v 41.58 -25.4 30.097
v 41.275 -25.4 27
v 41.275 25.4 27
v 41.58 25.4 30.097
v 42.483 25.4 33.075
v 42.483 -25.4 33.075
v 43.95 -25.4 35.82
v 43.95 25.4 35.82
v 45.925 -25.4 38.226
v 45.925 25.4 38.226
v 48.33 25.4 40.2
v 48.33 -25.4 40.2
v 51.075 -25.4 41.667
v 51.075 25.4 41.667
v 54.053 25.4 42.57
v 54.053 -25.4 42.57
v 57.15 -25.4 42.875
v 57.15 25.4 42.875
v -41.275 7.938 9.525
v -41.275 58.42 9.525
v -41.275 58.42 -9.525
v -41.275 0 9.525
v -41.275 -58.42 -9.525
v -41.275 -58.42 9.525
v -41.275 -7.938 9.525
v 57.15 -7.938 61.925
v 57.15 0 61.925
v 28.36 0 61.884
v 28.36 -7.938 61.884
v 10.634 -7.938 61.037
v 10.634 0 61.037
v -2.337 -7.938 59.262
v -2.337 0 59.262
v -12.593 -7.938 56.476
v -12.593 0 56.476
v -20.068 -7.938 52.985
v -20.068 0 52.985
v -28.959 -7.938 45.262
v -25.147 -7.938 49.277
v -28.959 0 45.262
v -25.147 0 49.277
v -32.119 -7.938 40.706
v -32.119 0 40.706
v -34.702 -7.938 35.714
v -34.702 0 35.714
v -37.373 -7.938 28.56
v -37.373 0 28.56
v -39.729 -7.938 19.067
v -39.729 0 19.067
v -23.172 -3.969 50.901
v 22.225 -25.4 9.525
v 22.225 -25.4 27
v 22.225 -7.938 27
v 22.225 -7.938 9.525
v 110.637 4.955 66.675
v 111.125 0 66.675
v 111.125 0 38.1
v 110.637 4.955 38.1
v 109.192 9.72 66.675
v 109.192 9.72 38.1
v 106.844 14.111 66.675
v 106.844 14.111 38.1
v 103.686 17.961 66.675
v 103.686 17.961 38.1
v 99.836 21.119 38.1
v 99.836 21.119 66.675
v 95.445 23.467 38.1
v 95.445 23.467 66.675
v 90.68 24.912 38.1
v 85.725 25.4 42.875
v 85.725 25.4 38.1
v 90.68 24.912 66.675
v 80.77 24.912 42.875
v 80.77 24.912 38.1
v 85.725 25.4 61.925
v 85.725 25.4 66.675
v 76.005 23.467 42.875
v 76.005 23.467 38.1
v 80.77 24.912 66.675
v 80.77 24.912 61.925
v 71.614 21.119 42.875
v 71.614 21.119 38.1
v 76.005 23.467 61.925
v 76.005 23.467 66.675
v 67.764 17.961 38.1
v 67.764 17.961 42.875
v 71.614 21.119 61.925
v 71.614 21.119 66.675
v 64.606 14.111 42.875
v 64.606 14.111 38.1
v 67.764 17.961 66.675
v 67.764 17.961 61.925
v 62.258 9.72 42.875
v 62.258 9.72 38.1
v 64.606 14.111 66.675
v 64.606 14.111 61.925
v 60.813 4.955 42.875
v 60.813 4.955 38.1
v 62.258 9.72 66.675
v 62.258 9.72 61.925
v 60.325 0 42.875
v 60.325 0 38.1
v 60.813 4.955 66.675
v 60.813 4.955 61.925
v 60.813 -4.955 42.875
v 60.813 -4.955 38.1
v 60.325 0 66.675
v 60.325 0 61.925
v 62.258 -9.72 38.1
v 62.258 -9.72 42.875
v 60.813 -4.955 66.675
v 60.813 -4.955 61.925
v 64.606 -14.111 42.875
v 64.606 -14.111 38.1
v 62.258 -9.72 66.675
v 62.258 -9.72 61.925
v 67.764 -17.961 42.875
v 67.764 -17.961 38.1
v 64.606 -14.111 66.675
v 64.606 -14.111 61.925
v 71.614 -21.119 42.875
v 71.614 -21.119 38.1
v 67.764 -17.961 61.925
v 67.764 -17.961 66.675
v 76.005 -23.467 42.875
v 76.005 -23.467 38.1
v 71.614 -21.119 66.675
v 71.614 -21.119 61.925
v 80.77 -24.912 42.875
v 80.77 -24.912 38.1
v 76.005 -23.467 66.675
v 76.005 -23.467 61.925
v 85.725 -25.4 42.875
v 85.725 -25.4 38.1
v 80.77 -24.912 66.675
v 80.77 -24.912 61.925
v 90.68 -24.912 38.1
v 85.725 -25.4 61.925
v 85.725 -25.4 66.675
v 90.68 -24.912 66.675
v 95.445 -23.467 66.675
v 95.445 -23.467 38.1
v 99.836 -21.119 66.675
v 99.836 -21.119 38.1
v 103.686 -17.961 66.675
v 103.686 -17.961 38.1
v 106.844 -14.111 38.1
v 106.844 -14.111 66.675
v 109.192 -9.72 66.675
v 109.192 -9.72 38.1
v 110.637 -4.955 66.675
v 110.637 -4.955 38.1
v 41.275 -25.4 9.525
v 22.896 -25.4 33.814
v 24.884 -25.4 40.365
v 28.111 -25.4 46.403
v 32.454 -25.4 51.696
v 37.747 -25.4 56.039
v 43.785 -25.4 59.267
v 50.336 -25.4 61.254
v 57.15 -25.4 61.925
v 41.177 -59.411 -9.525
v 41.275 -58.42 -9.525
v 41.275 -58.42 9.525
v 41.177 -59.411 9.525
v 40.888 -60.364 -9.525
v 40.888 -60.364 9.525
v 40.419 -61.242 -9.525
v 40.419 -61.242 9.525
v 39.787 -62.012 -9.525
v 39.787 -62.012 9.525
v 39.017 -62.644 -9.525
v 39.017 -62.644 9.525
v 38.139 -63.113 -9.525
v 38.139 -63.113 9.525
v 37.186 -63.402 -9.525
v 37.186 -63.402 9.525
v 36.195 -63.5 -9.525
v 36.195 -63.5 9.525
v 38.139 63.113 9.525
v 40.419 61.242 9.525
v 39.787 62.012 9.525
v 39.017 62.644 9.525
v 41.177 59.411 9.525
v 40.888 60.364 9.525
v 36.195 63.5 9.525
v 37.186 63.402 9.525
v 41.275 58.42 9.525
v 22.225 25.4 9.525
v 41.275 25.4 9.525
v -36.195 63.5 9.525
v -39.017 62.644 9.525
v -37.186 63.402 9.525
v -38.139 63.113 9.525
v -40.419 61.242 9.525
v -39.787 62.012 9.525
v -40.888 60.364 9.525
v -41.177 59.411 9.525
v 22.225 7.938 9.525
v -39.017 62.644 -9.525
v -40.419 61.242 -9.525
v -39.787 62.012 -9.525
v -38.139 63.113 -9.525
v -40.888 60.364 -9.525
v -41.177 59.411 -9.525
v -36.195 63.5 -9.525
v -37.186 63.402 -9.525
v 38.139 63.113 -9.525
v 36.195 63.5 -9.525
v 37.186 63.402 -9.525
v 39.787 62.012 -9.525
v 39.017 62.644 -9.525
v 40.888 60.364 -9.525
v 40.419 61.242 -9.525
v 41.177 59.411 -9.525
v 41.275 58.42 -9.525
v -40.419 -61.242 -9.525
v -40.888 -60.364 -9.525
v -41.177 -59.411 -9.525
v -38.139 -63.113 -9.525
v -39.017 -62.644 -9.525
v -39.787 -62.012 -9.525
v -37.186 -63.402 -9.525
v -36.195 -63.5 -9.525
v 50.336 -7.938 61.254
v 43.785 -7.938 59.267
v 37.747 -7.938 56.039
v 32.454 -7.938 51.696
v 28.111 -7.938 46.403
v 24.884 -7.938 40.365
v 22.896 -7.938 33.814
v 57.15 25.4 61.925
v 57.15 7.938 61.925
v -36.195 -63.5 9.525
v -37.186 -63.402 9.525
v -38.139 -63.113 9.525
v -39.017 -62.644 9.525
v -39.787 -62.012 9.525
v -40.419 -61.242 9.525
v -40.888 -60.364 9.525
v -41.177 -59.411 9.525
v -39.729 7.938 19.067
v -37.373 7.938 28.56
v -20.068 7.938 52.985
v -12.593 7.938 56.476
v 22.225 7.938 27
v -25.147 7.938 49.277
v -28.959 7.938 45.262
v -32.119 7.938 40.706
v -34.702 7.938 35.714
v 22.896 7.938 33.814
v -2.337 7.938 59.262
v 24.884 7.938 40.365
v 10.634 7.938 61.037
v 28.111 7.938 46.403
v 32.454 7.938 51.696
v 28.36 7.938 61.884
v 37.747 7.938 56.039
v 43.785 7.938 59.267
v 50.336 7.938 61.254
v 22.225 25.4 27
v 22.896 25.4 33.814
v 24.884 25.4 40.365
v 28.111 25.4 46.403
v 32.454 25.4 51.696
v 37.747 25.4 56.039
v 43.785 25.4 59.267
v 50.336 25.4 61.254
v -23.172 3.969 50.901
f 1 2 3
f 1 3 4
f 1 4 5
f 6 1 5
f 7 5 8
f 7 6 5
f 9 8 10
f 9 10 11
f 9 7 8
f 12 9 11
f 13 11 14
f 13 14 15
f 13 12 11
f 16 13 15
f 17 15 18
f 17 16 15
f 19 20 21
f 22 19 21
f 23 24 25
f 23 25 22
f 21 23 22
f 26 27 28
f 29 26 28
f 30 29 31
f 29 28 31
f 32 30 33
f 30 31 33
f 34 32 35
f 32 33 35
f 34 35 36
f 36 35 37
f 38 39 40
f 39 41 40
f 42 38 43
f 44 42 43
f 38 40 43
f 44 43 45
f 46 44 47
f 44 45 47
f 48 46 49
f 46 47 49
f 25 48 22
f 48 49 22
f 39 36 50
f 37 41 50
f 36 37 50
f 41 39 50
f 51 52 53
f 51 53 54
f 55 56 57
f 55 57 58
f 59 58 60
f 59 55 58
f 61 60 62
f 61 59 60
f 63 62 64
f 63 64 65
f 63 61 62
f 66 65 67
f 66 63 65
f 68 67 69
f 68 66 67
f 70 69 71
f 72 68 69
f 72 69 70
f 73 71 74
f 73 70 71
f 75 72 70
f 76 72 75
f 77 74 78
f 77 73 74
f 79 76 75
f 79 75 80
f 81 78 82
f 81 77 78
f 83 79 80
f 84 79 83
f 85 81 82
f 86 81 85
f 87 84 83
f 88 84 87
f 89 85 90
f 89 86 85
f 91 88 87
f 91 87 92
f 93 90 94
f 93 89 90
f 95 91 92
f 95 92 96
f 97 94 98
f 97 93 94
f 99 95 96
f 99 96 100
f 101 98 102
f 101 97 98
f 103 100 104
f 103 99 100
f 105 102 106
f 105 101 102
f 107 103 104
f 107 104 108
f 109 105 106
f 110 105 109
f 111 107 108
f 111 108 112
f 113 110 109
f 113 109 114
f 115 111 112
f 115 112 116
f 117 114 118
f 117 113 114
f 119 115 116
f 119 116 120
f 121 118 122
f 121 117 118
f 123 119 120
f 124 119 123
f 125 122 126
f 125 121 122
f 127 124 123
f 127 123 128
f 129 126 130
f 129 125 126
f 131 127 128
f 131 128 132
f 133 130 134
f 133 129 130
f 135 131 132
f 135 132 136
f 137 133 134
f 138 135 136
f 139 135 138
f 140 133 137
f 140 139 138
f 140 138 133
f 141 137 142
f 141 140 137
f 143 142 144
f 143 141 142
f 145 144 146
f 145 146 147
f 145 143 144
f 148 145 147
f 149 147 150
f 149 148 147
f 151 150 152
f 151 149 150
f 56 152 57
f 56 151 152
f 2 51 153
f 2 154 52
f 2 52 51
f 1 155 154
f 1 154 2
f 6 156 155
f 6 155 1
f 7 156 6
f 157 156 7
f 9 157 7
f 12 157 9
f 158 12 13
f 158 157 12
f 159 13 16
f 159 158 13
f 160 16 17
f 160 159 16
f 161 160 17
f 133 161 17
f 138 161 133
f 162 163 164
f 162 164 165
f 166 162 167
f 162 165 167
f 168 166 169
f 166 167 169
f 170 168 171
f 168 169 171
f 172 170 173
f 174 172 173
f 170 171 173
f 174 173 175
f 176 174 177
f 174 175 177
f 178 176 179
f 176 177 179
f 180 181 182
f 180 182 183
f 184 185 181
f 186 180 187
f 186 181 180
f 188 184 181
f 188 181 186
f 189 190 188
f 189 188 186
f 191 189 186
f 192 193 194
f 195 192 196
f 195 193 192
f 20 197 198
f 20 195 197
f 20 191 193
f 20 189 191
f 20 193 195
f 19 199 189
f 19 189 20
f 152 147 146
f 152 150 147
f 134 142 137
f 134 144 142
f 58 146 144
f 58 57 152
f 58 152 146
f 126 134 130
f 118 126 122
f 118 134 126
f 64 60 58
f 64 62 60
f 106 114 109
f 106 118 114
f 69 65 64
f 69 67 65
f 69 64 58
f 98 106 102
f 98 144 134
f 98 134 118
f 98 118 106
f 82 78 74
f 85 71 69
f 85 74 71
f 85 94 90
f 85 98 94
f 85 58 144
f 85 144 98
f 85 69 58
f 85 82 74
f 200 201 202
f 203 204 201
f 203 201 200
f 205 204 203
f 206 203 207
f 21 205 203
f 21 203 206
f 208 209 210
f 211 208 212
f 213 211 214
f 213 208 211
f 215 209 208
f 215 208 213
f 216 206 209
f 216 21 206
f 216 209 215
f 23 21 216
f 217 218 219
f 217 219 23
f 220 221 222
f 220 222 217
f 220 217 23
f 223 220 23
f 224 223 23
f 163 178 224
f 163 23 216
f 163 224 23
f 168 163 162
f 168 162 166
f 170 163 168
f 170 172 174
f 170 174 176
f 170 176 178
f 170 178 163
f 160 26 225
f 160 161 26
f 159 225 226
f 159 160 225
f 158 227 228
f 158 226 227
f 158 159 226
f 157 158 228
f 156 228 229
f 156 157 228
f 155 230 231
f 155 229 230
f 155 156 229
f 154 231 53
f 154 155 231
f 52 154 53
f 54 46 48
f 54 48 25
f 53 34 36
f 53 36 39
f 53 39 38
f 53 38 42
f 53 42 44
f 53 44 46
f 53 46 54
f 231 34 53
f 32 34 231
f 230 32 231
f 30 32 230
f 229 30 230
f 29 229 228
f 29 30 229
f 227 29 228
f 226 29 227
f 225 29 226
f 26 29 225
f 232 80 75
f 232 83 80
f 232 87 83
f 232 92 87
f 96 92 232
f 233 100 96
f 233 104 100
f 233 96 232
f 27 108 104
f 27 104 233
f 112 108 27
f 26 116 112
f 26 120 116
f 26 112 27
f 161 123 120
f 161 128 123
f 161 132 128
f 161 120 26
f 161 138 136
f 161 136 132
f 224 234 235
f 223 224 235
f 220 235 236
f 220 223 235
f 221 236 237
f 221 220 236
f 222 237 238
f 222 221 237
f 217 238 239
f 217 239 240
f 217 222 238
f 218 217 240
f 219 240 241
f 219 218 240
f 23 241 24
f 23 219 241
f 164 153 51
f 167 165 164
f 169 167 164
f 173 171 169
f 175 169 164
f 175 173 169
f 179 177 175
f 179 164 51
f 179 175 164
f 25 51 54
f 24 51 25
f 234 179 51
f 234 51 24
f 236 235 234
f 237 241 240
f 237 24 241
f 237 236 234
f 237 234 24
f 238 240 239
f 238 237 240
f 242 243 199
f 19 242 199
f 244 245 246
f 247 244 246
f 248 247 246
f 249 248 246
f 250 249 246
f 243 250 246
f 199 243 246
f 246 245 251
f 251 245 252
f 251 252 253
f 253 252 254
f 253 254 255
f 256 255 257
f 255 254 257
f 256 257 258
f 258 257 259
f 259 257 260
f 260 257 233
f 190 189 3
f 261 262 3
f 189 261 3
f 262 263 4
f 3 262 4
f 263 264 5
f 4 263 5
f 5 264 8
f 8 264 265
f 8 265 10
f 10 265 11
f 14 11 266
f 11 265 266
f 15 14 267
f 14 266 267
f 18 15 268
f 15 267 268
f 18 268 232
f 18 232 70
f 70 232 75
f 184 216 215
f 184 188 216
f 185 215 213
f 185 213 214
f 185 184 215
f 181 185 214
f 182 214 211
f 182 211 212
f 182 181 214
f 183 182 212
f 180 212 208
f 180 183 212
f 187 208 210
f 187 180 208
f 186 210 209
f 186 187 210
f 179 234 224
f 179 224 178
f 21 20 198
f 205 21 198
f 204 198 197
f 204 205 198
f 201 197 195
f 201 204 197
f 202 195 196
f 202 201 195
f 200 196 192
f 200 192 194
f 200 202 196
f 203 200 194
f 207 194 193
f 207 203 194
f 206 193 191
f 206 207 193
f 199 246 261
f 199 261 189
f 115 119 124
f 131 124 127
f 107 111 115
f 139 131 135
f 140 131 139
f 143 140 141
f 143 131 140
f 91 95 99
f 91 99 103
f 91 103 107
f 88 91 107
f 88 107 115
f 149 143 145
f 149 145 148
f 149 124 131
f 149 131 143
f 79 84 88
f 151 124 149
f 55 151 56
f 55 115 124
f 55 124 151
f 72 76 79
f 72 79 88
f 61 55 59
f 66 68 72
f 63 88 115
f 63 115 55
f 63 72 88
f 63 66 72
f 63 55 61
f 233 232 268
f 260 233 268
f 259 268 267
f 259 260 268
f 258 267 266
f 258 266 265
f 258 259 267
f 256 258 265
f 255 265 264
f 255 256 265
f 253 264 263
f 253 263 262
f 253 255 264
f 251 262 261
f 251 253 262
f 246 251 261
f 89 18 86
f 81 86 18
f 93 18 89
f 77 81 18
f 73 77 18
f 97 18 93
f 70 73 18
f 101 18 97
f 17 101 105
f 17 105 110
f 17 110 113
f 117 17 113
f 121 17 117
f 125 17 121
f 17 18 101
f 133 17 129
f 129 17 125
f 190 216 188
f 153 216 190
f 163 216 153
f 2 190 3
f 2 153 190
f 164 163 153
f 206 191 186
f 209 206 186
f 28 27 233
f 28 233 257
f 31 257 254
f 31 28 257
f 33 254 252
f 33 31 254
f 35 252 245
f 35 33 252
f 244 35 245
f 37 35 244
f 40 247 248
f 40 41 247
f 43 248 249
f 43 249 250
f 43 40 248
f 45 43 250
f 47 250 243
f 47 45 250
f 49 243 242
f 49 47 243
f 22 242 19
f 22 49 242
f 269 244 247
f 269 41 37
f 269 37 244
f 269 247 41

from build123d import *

# Parameters (mm, degrees)
F1_DEPTH = 63.5
F0_W     = 25.4
F0_H     = 19.05
F2_DEPTH = 25.4
F4_DEPTH = 7.9375
F5_R     = 5.08


with BuildPart() as f1:
    # F0 (on Front) → F1 (new body, symmetric)
    with BuildSketch(Plane.XZ):
        Polygon((41.275, -9.525), (41.275, 9.525), (22.225, 9.525), (-41.275, 9.525), (-41.275, -9.525), align=None)
    extrude(amount=F1_DEPTH, both=True)

    # F0 (on Front) → F2 (join, symmetric)
    with BuildSketch(Plane.XZ):
        with BuildLine():
            Line((22.225, 9.525), (41.275, 9.525))
            Line((41.275, 9.525), (41.275, 27.0002))
            ThreePointArc((41.275, 27.0002), (45.9246798487, 38.2255201513), (57.15, 42.8752))
            Line((57.15, 42.8752), (60.325, 42.8752))
            Line((60.325, 42.8752), (60.325, 61.9252))
            Line((60.325, 61.9252), (57.15, 61.9252))
            ThreePointArc((57.15, 61.9252), (32.4542956671, 51.6959043329), (22.225, 27.0002))
            Line((22.225, 27.0002), (22.225, 9.525))
        make_face()
        with Locations((73.025, 52.4002)):
            Rectangle(F0_W, F0_H)
    extrude(amount=F2_DEPTH, both=True)

    # F0 (on Front) → F3 (revolve)
    with BuildSketch(Plane.XZ):
        Polygon((85.725, 61.9252), (85.725, 42.8752), (85.725, 38.1), (111.125, 38.1), (111.125, 66.675), (85.725, 66.675), align=None)
    revolve(axis=Axis((85.725, 0, 52.3875), (0, 0, 1)))

    # F0 (on Front) → F4 (join, symmetric)
    with BuildSketch(Plane.XZ):
        with BuildLine():
            Line((-41.275, 9.525), (22.225, 9.525))
            Line((22.225, 9.525), (22.225, 27.0002))
            ThreePointArc((22.225, 27.0002), (32.4542956671, 51.6959043329), (57.15, 61.9252))
            add(Edge.make_bspline(
                [(57.15, 61.9252), (24.6527968383, 61.9252), (-30.2506246056, 64.332675823), (-39.2470384075, 24.7092637795), (-41.275, 9.525)],
                knots=[0, 0, 0, 0, 0.5726218411, 1, 1, 1, 1], degree=3))
        make_face()
    extrude(amount=F4_DEPTH, both=True)

    # F5
    f5_edges = [f1.edges().sort_by_distance(p)[0] for p in [
        (-41.275, -63.5, 0),
        (41.275, -63.5, 0),
        (41.275, 63.5, 0),
        (-41.275, 63.5, 0),
    ]]
    fillet(f5_edges, radius=F5_R)


solid = f1.part
